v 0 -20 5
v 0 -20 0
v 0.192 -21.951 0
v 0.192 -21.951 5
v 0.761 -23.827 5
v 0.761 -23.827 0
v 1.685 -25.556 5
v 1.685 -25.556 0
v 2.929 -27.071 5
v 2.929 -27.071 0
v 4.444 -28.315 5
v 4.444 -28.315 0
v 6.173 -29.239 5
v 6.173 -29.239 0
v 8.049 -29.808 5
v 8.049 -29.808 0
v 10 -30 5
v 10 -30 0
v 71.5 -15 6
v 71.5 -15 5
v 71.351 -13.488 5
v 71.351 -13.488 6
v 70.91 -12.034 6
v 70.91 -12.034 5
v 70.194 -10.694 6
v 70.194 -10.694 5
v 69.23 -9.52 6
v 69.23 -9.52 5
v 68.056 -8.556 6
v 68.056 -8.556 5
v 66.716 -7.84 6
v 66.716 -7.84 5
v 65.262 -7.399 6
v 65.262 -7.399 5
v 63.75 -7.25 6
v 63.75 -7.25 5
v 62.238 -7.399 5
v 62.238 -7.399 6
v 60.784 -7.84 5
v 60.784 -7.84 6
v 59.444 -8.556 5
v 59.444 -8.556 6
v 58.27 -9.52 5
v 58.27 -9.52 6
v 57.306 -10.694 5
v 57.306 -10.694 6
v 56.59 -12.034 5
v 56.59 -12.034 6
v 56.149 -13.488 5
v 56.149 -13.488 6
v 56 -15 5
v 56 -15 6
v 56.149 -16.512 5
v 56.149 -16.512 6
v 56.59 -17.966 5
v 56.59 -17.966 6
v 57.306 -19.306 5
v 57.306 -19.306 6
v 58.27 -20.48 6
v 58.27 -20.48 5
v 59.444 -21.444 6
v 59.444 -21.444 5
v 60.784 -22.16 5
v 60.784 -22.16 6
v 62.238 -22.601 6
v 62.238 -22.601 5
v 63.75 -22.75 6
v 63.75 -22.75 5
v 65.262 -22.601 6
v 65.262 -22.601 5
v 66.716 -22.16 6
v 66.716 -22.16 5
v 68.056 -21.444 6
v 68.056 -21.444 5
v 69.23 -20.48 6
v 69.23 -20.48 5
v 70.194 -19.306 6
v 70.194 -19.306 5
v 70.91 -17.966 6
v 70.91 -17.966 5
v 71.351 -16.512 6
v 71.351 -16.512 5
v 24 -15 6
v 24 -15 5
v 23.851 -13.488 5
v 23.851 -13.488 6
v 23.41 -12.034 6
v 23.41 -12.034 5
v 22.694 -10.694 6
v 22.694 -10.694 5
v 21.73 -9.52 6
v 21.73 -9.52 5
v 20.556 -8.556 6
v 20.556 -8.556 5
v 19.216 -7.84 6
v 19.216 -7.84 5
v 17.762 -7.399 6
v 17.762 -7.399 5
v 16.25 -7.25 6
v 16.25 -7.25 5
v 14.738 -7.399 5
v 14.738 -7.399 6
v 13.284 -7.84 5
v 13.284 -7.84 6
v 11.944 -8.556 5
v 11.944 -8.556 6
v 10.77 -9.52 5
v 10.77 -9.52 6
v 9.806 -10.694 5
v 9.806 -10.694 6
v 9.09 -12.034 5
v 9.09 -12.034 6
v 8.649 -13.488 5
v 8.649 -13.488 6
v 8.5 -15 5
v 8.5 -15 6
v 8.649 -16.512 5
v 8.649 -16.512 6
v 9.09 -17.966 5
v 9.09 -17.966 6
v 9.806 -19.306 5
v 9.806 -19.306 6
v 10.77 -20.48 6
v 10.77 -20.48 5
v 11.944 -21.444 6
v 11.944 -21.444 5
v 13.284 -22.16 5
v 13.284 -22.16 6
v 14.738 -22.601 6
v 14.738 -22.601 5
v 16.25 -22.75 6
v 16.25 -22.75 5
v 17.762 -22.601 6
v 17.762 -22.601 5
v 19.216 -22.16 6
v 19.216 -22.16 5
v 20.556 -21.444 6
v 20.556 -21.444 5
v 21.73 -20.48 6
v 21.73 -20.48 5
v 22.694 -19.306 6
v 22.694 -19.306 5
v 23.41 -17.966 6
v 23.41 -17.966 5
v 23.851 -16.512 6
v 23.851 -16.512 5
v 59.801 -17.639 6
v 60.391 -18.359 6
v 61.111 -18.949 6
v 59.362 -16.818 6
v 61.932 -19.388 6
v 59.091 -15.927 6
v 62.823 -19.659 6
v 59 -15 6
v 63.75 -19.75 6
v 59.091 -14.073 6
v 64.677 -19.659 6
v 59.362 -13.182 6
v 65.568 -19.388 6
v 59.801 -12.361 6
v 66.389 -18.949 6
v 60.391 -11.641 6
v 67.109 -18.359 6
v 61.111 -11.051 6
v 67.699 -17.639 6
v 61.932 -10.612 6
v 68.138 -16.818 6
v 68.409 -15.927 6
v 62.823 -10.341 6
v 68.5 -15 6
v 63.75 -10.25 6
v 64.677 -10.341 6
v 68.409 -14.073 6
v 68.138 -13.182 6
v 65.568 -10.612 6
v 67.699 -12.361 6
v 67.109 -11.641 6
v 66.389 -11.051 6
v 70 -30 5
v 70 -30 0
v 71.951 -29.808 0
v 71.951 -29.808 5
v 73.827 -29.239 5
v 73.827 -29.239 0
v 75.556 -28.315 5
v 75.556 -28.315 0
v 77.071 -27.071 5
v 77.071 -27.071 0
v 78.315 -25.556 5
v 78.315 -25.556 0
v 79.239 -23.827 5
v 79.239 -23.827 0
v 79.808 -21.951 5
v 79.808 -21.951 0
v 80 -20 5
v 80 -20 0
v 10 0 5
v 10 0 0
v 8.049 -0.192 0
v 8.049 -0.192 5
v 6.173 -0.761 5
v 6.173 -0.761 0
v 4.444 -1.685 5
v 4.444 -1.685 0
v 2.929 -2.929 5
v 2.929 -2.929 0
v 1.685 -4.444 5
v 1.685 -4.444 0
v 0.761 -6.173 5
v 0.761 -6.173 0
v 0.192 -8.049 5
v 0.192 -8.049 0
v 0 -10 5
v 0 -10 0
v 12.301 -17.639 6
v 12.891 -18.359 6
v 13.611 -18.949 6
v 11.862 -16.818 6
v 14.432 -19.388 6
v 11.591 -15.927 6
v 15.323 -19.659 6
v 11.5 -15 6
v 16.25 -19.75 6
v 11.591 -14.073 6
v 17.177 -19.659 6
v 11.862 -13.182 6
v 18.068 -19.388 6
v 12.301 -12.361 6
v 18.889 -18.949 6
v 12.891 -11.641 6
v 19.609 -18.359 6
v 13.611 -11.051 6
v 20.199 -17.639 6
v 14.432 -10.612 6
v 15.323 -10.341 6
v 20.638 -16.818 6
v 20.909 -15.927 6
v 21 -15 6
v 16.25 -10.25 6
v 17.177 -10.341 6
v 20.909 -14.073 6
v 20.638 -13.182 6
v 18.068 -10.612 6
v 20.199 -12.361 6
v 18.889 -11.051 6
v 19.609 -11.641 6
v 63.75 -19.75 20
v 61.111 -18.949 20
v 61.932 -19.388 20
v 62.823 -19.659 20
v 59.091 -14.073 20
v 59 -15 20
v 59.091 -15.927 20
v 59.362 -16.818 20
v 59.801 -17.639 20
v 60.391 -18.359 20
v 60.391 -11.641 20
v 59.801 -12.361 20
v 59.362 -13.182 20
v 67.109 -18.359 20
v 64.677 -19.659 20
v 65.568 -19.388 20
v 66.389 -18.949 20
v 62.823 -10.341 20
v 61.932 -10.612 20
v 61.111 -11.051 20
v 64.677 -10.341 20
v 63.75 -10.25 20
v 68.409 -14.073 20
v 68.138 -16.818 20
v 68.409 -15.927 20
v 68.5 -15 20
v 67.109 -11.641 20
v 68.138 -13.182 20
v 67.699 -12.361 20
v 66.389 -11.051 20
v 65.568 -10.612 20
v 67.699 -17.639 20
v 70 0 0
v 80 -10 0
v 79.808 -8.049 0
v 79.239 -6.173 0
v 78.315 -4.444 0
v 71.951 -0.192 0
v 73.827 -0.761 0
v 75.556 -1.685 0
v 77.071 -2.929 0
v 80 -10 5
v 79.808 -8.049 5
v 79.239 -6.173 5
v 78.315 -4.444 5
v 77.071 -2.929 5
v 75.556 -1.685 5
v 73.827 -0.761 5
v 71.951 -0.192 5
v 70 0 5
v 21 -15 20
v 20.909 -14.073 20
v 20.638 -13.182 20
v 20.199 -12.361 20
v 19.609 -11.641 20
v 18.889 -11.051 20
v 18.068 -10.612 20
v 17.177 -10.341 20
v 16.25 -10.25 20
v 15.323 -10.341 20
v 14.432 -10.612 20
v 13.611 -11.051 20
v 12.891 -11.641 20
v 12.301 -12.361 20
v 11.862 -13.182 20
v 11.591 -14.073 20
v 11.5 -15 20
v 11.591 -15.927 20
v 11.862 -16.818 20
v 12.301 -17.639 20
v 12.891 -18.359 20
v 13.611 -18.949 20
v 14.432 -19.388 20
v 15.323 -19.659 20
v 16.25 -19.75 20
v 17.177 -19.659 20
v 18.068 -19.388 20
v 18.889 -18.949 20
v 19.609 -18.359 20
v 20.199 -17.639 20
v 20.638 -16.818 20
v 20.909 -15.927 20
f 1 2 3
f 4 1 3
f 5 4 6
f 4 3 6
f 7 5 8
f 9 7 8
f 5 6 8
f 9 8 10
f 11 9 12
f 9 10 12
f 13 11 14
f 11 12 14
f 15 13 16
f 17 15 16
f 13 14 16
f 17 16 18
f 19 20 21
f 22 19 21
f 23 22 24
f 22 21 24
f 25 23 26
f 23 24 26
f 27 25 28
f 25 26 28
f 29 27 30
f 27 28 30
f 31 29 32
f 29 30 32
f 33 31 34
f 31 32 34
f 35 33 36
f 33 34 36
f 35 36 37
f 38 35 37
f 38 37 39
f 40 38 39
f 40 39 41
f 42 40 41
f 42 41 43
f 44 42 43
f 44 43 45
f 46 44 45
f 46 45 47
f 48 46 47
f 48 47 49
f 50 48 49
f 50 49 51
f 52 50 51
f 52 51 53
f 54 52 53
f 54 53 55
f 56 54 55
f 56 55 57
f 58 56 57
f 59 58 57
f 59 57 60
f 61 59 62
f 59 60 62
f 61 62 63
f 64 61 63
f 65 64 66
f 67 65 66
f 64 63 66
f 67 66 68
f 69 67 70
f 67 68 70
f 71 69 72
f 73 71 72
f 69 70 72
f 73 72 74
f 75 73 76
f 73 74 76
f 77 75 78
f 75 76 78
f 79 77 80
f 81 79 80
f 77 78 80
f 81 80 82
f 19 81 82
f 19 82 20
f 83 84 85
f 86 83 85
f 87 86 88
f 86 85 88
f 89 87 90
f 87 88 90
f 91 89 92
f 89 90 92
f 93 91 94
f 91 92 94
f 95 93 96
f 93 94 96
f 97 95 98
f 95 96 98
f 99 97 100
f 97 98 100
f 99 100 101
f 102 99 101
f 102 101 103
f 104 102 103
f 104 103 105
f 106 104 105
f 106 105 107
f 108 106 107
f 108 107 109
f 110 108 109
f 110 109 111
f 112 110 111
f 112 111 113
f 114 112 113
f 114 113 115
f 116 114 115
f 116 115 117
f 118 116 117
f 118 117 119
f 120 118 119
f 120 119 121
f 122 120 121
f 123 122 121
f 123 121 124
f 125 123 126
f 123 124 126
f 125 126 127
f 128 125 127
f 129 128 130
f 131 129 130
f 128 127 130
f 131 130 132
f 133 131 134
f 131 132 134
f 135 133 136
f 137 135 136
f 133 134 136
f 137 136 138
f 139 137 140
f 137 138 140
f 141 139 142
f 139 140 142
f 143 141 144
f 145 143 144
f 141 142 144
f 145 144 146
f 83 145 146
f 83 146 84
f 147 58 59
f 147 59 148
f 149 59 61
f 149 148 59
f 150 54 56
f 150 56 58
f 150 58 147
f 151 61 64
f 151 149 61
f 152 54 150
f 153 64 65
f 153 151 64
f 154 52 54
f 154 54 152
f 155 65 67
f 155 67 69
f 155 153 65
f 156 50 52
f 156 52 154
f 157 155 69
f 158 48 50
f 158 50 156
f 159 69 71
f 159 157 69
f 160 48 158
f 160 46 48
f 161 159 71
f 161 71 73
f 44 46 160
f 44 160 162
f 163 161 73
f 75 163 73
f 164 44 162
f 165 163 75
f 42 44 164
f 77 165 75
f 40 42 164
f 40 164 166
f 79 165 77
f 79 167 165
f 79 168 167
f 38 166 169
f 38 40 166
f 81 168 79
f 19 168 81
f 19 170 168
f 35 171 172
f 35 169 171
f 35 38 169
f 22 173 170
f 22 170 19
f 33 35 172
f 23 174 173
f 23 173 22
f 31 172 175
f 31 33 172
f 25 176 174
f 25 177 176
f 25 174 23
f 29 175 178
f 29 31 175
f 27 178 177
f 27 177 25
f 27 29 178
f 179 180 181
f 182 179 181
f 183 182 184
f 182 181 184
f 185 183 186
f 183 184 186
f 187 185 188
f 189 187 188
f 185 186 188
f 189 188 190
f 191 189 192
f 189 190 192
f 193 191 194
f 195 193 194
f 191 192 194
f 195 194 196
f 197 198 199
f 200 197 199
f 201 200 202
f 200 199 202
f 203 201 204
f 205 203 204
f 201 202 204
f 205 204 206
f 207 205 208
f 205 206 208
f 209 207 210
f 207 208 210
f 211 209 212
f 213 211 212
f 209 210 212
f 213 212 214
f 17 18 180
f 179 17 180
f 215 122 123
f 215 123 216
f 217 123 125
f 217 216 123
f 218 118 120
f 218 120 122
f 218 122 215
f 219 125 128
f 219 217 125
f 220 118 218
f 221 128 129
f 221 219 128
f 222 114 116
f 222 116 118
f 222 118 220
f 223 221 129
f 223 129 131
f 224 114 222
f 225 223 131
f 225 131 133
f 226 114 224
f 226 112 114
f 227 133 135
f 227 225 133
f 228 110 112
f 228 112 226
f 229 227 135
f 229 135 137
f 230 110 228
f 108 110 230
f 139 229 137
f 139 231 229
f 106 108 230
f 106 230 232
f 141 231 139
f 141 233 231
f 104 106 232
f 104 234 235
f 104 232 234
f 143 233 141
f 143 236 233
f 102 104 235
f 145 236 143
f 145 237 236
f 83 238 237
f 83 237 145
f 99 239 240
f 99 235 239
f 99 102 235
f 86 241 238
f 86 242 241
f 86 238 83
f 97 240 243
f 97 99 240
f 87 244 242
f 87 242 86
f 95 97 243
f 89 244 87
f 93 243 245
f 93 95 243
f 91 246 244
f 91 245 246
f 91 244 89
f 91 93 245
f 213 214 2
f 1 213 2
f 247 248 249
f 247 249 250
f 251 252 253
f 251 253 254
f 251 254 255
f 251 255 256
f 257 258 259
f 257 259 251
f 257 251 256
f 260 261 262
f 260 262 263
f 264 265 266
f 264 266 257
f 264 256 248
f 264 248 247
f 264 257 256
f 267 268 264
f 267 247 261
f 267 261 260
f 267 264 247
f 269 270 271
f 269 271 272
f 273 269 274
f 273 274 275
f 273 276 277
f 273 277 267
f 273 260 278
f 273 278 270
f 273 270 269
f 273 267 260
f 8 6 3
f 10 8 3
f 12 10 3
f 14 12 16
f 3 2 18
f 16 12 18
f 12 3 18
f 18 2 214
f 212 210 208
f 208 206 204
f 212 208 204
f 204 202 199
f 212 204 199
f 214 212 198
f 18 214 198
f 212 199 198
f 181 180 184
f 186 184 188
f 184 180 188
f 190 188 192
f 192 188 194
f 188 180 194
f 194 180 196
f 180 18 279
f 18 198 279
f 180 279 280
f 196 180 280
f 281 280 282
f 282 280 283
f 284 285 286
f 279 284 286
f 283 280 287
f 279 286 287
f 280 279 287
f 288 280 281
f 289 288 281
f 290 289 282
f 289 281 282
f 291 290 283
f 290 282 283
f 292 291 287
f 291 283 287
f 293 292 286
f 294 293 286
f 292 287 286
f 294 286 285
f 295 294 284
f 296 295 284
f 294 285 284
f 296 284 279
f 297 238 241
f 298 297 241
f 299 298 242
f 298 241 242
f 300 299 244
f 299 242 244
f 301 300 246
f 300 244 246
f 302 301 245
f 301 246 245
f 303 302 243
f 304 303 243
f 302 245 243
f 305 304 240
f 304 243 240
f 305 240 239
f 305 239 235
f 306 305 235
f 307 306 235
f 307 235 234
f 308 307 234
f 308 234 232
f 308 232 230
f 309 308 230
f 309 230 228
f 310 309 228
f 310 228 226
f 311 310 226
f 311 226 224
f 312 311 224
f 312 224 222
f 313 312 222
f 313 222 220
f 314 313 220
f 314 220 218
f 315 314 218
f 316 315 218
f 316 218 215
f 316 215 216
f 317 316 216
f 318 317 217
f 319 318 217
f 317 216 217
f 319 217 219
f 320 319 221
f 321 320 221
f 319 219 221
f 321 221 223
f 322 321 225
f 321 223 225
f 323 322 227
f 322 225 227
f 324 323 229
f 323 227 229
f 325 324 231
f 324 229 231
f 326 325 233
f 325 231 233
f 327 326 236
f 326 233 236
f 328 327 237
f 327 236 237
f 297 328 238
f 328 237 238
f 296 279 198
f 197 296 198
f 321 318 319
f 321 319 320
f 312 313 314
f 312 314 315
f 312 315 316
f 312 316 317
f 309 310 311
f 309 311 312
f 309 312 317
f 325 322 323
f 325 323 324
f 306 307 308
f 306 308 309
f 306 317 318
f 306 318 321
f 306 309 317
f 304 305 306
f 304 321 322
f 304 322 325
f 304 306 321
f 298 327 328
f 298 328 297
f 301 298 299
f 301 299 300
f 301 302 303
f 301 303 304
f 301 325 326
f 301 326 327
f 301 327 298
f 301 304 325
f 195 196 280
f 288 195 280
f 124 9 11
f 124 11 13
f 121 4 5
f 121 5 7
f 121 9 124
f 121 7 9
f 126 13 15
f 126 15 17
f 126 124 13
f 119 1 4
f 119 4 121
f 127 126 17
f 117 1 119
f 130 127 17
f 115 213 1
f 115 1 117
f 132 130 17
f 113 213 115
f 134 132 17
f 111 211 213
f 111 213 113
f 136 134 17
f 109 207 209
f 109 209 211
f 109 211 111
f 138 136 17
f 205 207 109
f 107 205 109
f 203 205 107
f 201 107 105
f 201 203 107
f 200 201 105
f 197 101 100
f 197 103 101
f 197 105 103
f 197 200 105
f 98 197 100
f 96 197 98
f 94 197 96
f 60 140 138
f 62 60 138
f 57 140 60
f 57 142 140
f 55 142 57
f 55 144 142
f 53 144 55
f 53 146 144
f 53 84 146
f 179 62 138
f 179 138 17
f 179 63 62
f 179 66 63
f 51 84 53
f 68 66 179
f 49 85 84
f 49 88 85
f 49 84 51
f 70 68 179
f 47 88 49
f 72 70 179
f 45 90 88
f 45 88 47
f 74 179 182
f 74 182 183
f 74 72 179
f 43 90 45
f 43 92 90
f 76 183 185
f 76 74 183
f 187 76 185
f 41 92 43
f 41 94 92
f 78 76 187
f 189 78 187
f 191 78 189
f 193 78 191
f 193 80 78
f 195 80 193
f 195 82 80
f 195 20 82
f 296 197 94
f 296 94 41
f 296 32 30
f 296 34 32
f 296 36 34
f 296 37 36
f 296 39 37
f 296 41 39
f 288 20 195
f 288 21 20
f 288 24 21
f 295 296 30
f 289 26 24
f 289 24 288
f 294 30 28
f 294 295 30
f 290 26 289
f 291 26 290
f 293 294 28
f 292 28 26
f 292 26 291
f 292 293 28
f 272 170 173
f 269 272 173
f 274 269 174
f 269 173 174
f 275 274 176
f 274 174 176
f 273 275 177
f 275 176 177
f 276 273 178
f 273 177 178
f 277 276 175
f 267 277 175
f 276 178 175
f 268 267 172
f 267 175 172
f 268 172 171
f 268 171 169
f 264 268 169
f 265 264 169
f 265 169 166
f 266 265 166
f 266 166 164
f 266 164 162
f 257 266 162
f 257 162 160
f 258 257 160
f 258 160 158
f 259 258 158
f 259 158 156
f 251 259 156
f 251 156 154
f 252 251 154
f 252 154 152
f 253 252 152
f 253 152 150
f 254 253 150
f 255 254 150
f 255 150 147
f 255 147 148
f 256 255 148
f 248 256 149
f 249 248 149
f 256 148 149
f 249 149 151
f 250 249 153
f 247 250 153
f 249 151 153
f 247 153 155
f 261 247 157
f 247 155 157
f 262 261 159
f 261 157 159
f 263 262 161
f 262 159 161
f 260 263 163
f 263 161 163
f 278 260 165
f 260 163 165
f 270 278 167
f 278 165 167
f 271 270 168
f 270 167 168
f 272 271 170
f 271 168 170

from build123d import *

# Parameters (mm, degrees)
F0_R     = 7.75
F1_DEPTH = 5
F0_R_2   = 4.75
F2_DEPTH = 6
F3_DEPTH = 20


with BuildPart() as f1:
    # F0 (on Top) → F1 (new body)
    with BuildSketch(Plane.XY):
        with BuildLine():
            Line((70, 0), (10, 0))
            ThreePointArc((10, 0), (2.928932, -2.928932), (0, -10))
            Line((0, -10), (0, -20))
            ThreePointArc((0, -20), (2.928932, -27.071068), (10, -30))
            Line((10, -30), (70, -30))
            ThreePointArc((70, -30), (77.071068, -27.071068), (80, -20))
            Line((80, -20), (80, -10))
            ThreePointArc((80, -10), (77.071068, -2.928932), (70, 0))
        make_face()
        with Locations((16.25, -15)):
            Circle(F0_R, mode=Mode.SUBTRACT)
        with Locations((63.75, -15)):
            Circle(F0_R, mode=Mode.SUBTRACT)
    extrude(amount=F1_DEPTH)

    # F0 (on Top) → F2 (join)
    with BuildSketch(Plane.XY):
        with Locations((16.25, -15)):
            Circle(F0_R)
        with Locations((16.25, -15)):
            Circle(F0_R_2, mode=Mode.SUBTRACT)
        with Locations((63.75, -15)):
            Circle(F0_R)
        with Locations((63.75, -15)):
            Circle(F0_R_2, mode=Mode.SUBTRACT)
    extrude(amount=F2_DEPTH)

    # F0 (on Top) → F3 (join)
    with BuildSketch(Plane.XY):
        with Locations((16.25, -15)):
            Circle(F0_R_2)
        with Locations((63.75, -15)):
            Circle(F0_R_2)
    extrude(amount=F3_DEPTH)


solid = f1.part
